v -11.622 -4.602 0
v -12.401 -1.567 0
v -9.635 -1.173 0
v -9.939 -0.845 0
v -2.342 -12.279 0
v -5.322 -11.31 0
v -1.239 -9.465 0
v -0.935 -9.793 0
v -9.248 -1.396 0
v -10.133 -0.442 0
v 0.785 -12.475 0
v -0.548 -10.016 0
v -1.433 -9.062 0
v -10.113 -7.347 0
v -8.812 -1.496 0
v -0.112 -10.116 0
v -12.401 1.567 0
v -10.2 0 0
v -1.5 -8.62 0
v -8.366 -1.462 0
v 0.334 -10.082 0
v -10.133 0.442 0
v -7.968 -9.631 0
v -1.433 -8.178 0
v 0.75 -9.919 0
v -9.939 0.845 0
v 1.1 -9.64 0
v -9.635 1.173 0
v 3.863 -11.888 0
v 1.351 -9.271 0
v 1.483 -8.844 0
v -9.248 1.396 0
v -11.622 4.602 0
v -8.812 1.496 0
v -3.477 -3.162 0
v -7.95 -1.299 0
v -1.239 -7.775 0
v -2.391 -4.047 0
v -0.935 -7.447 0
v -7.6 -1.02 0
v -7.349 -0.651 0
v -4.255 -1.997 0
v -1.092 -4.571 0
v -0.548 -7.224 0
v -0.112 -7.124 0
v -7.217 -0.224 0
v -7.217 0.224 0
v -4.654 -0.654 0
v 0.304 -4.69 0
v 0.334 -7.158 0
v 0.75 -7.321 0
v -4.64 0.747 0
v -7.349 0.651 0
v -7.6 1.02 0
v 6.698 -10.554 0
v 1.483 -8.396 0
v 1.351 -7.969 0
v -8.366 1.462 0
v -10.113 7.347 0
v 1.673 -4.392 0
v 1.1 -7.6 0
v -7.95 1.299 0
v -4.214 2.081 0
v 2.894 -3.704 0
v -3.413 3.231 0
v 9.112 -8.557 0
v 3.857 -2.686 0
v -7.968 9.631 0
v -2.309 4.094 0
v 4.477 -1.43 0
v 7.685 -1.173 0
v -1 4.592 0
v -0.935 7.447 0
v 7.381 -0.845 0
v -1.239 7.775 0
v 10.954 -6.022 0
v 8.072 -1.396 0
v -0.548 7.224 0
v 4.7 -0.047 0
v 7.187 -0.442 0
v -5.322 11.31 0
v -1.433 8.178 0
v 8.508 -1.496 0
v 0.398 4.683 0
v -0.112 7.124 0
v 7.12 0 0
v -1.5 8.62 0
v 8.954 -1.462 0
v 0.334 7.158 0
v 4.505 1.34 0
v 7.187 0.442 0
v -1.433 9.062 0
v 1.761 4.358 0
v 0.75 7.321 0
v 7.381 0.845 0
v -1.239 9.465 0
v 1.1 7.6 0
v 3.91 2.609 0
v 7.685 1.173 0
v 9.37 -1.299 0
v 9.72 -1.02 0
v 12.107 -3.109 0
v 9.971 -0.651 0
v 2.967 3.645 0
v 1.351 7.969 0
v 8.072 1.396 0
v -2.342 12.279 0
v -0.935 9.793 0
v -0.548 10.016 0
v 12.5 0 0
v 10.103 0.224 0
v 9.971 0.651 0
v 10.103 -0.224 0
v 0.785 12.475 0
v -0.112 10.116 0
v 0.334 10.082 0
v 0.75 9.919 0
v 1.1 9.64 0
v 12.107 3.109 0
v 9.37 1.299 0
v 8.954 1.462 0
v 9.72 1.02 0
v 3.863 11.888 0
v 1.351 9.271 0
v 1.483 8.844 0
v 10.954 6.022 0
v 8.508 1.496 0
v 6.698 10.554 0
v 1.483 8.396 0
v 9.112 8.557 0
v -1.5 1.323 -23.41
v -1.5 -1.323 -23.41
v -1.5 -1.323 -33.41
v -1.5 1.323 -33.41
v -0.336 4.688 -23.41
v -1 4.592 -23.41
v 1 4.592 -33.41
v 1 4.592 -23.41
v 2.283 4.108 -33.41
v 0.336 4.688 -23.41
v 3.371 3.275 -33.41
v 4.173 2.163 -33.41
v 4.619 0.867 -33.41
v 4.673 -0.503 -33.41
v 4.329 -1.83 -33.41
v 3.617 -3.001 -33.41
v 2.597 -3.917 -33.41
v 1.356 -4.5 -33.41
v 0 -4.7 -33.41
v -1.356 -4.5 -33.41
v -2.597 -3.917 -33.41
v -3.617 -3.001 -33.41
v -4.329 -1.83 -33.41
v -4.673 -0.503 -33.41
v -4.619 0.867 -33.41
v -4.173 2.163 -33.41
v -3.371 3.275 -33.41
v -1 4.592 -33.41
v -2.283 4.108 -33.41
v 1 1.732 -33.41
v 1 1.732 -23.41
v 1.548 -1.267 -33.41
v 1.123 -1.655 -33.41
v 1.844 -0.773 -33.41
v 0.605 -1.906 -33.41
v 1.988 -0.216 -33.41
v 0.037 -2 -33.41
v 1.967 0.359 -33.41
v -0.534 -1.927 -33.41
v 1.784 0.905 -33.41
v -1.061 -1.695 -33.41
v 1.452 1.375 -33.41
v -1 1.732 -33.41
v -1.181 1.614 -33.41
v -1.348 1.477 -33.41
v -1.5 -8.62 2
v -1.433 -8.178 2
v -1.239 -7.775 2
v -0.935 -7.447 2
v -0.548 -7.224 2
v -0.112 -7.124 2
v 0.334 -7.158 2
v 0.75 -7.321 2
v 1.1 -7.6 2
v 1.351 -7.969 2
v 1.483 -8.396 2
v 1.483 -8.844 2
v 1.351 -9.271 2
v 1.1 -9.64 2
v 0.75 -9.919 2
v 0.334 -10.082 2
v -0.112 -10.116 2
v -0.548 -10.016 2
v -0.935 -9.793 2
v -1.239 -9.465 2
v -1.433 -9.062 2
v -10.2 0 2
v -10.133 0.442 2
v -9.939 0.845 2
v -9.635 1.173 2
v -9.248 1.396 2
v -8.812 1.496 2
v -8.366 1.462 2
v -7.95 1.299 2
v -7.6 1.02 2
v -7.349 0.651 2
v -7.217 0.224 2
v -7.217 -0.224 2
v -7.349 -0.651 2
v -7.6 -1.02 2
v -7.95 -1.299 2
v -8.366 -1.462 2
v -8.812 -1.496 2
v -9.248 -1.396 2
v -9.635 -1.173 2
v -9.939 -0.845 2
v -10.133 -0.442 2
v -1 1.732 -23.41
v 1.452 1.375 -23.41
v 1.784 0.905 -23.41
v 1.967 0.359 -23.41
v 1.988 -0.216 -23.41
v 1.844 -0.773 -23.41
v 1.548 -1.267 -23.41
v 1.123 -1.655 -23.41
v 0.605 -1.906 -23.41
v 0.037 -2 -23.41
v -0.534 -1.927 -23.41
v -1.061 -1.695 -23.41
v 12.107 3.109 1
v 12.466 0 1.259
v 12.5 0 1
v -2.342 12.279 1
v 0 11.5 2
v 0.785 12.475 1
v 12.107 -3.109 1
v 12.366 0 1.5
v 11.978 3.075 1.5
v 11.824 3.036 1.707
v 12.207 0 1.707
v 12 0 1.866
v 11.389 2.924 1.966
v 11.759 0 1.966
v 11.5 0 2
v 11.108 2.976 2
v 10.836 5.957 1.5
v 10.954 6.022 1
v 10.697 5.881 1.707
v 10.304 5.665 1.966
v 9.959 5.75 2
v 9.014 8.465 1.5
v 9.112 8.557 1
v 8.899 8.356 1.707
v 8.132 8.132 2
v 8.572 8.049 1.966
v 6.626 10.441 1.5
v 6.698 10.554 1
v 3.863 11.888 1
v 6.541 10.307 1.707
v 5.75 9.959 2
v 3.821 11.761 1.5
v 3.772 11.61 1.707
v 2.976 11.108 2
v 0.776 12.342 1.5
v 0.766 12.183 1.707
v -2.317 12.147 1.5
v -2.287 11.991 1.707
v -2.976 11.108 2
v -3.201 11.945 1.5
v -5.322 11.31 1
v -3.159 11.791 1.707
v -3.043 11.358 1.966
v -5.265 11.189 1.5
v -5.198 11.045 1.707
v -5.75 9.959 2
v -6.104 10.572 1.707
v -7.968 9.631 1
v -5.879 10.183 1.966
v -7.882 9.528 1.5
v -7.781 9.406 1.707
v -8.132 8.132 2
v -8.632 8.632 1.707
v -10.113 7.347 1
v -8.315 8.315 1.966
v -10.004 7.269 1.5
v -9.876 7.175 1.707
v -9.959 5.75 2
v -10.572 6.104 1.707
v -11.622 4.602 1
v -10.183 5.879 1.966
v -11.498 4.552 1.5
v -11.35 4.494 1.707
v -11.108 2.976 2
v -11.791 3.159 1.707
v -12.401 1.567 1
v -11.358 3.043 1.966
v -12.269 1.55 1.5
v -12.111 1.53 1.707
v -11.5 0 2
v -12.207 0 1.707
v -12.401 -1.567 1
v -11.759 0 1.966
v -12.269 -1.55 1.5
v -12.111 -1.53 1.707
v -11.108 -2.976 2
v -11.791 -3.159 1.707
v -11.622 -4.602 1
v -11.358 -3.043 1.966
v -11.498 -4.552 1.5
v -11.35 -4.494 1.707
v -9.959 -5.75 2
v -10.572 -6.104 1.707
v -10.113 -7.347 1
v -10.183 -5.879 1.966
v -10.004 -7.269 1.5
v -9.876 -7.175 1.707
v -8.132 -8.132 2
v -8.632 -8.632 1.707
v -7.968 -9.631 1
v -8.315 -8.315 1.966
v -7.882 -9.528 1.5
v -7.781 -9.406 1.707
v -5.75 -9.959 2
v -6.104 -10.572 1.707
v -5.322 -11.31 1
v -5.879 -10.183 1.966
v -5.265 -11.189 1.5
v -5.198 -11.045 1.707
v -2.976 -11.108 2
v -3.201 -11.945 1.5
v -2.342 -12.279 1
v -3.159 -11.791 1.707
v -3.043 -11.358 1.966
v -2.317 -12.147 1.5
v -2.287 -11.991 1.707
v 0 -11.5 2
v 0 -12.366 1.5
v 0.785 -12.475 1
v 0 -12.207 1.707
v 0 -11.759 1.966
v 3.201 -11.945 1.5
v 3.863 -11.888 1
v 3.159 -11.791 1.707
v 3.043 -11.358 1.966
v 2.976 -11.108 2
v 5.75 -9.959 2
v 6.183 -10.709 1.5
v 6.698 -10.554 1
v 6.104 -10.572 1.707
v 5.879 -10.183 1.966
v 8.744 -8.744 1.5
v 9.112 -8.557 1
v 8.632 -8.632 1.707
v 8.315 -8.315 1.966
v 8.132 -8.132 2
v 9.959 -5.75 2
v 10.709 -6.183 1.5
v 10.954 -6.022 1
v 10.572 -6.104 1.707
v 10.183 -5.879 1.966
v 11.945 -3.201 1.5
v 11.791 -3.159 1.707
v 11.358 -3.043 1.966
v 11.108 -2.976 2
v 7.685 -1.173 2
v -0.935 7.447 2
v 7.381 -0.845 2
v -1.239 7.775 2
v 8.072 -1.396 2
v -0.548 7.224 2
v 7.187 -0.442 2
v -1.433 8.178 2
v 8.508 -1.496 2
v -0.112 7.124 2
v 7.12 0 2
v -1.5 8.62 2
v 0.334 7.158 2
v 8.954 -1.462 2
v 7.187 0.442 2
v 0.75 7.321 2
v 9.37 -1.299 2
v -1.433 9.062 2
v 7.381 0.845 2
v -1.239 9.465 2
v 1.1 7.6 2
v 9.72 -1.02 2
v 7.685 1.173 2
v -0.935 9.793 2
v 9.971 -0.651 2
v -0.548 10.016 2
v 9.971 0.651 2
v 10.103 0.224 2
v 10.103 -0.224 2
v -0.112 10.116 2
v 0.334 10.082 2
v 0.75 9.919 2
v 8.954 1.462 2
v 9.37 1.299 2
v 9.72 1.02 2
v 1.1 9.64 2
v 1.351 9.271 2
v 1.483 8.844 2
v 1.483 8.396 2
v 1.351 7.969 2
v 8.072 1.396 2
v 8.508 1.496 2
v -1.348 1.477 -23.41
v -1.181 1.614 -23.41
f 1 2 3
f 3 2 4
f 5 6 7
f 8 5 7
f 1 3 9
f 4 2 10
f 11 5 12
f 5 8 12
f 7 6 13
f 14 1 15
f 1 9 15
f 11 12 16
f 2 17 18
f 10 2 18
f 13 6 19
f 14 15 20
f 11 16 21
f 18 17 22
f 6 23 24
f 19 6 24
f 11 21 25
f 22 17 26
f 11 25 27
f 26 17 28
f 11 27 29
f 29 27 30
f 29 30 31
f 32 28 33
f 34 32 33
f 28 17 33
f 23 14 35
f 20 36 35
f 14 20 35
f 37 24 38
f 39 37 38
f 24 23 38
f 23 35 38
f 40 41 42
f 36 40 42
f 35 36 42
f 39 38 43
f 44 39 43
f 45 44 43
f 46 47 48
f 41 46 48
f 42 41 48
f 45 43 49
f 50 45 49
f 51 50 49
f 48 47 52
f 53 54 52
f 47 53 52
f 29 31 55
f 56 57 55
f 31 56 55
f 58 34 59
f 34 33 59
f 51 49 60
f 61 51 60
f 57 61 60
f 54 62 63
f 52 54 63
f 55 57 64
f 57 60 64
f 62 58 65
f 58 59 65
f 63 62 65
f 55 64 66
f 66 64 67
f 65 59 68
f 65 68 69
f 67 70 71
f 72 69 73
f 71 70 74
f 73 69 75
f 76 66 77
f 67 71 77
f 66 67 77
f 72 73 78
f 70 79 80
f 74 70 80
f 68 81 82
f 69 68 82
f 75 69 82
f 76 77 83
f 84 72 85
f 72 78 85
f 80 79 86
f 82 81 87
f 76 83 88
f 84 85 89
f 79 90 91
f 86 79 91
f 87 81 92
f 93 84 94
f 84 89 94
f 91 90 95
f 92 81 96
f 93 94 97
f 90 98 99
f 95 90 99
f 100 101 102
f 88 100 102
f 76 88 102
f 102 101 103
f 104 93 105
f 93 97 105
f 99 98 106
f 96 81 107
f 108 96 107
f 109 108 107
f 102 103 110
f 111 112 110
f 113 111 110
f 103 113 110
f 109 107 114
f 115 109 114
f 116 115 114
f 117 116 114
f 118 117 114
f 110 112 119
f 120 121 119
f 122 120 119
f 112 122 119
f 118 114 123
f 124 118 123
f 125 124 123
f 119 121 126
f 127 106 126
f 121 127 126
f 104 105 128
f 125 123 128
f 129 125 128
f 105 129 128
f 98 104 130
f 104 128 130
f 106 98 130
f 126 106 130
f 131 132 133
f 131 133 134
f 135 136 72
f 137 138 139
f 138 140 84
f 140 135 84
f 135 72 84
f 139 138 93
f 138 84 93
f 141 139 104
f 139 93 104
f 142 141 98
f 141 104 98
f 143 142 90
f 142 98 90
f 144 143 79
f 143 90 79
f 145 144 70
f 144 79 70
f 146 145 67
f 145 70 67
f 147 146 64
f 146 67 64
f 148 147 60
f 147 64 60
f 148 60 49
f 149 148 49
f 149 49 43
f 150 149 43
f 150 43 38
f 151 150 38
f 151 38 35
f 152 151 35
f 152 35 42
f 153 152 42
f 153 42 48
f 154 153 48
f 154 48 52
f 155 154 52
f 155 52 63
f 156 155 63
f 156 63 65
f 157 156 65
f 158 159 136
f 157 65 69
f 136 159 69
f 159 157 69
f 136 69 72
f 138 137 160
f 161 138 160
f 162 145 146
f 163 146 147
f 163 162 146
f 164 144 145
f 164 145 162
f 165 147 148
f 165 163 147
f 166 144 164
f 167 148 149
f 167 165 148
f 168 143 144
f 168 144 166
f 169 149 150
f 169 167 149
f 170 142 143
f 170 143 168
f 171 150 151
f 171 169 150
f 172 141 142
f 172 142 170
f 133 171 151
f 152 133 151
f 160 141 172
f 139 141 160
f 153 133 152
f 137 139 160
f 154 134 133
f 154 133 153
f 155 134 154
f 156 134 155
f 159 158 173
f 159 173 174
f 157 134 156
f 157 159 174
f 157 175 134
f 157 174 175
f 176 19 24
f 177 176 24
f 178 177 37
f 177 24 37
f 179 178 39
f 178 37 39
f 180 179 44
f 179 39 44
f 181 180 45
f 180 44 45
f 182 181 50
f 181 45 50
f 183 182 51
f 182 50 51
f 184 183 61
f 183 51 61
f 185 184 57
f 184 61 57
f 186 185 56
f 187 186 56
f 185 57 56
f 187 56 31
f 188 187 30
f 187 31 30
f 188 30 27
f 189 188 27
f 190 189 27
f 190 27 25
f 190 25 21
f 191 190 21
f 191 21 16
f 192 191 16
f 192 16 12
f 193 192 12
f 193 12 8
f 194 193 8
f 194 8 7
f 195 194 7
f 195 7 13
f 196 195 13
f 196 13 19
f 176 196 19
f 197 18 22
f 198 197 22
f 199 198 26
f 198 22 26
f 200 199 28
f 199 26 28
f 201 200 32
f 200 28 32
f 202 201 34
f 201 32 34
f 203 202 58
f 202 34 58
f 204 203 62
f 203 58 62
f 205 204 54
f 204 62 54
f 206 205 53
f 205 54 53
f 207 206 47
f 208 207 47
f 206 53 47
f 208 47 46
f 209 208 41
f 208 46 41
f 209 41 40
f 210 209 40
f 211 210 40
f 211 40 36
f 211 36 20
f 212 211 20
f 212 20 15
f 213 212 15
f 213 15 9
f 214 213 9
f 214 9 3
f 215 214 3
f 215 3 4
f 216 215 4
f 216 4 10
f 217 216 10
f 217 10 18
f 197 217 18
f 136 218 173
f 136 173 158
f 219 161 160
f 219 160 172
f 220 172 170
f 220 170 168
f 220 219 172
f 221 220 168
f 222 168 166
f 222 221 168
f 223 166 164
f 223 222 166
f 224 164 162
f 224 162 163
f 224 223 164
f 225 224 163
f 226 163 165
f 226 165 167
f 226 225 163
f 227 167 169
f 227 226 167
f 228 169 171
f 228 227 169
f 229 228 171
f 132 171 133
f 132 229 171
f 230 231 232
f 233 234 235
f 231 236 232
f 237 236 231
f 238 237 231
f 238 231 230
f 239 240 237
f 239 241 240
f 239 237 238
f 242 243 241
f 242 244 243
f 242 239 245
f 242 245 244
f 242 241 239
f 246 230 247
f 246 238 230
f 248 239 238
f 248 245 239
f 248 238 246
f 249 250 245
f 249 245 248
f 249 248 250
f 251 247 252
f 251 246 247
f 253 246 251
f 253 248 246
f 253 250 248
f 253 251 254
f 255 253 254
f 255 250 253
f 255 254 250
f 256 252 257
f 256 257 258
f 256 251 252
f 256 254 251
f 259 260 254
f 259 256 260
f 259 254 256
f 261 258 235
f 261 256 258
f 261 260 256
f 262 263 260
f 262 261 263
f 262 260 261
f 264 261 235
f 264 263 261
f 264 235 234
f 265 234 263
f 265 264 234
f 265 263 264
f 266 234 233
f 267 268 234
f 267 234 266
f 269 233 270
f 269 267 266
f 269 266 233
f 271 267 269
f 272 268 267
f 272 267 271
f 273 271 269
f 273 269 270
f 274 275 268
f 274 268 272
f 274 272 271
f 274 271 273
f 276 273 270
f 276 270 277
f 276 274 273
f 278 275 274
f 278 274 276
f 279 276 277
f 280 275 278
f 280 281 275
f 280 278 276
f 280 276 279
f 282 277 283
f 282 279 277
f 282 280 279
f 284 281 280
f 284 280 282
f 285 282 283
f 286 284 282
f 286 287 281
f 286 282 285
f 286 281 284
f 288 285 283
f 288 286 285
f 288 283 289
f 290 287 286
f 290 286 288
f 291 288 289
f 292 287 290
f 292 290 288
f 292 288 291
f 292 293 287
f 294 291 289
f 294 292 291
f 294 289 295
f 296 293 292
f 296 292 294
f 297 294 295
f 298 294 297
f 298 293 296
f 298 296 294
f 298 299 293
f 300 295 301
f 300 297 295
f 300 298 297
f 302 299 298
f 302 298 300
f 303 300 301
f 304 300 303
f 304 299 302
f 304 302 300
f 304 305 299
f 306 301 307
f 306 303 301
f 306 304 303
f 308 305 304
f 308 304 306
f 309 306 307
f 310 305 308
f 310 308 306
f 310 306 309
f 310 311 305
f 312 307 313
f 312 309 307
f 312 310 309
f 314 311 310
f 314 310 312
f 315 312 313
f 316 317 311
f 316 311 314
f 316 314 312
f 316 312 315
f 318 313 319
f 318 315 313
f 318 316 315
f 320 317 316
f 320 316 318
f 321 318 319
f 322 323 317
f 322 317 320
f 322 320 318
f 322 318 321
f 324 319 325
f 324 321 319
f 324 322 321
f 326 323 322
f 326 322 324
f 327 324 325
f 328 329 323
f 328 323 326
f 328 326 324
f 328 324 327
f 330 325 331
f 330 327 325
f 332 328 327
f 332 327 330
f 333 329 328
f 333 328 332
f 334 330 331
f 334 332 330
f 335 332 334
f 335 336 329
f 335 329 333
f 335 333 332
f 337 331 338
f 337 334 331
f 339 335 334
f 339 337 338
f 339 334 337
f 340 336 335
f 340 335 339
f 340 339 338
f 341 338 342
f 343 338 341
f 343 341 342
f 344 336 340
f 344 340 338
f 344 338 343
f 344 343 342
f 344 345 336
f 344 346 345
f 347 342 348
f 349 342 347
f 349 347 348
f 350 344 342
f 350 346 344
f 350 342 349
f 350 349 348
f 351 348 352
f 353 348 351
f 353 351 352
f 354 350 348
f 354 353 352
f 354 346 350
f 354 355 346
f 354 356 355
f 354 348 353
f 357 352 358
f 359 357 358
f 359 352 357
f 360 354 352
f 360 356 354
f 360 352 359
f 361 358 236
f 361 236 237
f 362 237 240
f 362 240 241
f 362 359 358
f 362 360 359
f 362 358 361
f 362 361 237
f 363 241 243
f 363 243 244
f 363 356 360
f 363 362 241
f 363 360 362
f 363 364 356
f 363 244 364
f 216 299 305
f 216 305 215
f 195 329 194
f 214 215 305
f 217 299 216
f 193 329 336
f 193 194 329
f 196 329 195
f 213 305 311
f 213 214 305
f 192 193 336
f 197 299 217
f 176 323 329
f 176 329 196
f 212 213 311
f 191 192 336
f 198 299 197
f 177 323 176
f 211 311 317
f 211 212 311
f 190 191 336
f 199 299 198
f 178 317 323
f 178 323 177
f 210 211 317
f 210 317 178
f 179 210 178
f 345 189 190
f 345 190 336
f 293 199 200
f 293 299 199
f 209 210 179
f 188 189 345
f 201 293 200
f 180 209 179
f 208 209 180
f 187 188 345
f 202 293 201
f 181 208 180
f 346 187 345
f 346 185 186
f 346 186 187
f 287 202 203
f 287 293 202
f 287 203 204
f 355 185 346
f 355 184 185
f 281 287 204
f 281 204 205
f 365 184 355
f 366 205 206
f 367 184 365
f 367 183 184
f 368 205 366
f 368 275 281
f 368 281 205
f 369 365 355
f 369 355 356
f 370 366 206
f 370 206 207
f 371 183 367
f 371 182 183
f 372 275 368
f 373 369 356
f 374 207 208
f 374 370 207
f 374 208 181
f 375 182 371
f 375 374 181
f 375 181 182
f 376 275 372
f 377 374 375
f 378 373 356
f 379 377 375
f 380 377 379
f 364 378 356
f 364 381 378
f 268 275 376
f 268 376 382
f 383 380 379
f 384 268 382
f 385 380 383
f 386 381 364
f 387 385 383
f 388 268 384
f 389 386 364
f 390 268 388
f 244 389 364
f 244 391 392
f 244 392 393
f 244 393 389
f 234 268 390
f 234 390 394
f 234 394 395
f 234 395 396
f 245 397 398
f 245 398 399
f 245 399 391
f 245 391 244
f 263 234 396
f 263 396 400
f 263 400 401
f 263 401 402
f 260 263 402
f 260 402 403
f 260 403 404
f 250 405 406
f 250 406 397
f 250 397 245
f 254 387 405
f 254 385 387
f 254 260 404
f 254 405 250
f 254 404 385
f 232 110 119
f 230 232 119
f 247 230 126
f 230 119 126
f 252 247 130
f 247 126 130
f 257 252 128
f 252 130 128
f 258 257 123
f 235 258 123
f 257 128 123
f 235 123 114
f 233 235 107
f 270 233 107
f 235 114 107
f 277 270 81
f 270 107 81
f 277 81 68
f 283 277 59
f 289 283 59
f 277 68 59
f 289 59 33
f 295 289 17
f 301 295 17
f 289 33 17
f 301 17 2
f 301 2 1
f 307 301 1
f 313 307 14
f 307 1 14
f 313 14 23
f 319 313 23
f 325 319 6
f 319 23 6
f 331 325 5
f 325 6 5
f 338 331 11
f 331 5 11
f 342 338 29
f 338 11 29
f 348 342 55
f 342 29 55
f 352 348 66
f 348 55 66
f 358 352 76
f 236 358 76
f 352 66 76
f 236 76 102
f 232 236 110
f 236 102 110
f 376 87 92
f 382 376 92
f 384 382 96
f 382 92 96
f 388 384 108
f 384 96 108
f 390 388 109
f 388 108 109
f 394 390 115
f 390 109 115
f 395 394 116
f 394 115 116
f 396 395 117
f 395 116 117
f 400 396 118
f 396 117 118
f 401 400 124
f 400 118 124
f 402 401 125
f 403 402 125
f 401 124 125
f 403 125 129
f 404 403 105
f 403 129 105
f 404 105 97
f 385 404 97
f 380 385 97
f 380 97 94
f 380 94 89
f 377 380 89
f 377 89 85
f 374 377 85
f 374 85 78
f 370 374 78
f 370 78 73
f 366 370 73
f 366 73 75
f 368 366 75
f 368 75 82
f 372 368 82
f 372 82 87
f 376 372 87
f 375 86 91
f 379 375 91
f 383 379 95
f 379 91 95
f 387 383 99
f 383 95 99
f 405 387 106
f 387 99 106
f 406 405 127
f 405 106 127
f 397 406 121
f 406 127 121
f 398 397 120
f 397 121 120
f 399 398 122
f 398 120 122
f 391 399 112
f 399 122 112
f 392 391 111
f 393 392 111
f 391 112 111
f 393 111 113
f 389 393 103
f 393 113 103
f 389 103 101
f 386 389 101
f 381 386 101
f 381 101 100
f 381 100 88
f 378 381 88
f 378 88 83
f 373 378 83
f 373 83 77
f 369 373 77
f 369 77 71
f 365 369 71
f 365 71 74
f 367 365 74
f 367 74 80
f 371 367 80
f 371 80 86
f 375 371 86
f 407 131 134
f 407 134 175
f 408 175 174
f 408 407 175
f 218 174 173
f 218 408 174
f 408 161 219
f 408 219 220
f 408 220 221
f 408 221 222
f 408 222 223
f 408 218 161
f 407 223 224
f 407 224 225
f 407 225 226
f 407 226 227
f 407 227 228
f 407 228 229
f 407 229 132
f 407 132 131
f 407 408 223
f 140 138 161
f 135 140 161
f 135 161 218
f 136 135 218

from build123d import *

# Parameters (mm, degrees)
CROQUIS1_R              = 12.5
SALIENTE_EXTRUIR1_DEPTH = 2
REDONDEO2_R             = 1
CROQUIS2_R              = 5
SALIENTE_EXTRUIR2_DEPTH = 33.41
CROQUIS3_R              = 1.5
CORTAR_EXTRUIR1_DEPTH   = 23.41
CORTAR_EXTRUIR2_START   = -10
CORTAR_EXTRUIR2_DEPTH   = 10
CORTAR_EXTRUIR7_START   = -33.41
CROQUIS9_R              = 5
CROQUIS9_R_2            = 4.7
CORTAR_EXTRUIR7_DEPTH   = 33.41


with BuildPart() as part:
    # Croquis1 → Saliente-Extruir1 (new body)
    with BuildSketch(Plane.XY):
        Circle(CROQUIS1_R)
    extrude(amount=SALIENTE_EXTRUIR1_DEPTH)

    # Redondeo2
    redondeo2_edges = [part.edges().sort_by_distance(p)[0] for p in [
        (-12.5, 0, 2),
    ]]
    fillet(redondeo2_edges, radius=REDONDEO2_R)

    # Croquis2 → Saliente-Extruir2 (add)
    with BuildSketch(Plane(origin=(0, 0, 0), x_dir=(-1, 0, 0), z_dir=(0, 0, -1))):
        Circle(CROQUIS2_R)
    extrude(amount=SALIENTE_EXTRUIR2_DEPTH)

    # Croquis3 → Cortar-Extruir1 (cut)
    with BuildSketch(Plane(origin=(0, 0, 0), x_dir=(-1, 0, 0), z_dir=(0, 0, -1))):
        with Locations((0, 8.62)):
            Circle(CROQUIS3_R)
        with Locations((-8.62, 0)):
            Circle(CROQUIS3_R)
        with Locations((8.7, 0)):
            Circle(CROQUIS3_R)
        with Locations((0, -8.62)):
            Circle(CROQUIS3_R)
    extrude(amount=-CORTAR_EXTRUIR1_DEPTH, mode=Mode.SUBTRACT)

    # Croquis4 → Cortar-Extruir2 (cut)
    with BuildSketch(Plane(origin=(0, 0, -33.41), x_dir=(-1, 0, 0), z_dir=(0, 0, -1)).offset(CORTAR_EXTRUIR2_START)):
        with BuildLine():
            Line((-1, 4.898979486), (-1, 1.732050808))
            ThreePointArc((-1, 1.732050808), (-1.547786782, -1.266631784), (1.5, -1.322875656))
            Line((1.5, -1.322875656), (1.5, 1.322875656))
            ThreePointArc((1.5, 1.322875656), (1.266631784, 1.547786782), (1, 1.732050808))
            Line((1, 1.732050808), (1, 4.898979486))
            ThreePointArc((1, 4.898979486), (0, 5), (-1, 4.898979486))
        make_face()
    extrude(amount=CORTAR_EXTRUIR2_DEPTH, mode=Mode.SUBTRACT)

    # Croquis9 → Cortar-Extruir7 (cut)
    with BuildSketch(Plane(origin=(0, 0, -33.41), x_dir=(-1, 0, 0), z_dir=(0, 0, -1)).offset(CORTAR_EXTRUIR7_START)):
        Circle(CROQUIS9_R)
        with Locations(Location((0, 0, 0), (0, 0, 77.715506144))):
            Circle(CROQUIS9_R_2, mode=Mode.SUBTRACT)
    extrude(amount=CORTAR_EXTRUIR7_DEPTH, mode=Mode.SUBTRACT)


solid = part.part
